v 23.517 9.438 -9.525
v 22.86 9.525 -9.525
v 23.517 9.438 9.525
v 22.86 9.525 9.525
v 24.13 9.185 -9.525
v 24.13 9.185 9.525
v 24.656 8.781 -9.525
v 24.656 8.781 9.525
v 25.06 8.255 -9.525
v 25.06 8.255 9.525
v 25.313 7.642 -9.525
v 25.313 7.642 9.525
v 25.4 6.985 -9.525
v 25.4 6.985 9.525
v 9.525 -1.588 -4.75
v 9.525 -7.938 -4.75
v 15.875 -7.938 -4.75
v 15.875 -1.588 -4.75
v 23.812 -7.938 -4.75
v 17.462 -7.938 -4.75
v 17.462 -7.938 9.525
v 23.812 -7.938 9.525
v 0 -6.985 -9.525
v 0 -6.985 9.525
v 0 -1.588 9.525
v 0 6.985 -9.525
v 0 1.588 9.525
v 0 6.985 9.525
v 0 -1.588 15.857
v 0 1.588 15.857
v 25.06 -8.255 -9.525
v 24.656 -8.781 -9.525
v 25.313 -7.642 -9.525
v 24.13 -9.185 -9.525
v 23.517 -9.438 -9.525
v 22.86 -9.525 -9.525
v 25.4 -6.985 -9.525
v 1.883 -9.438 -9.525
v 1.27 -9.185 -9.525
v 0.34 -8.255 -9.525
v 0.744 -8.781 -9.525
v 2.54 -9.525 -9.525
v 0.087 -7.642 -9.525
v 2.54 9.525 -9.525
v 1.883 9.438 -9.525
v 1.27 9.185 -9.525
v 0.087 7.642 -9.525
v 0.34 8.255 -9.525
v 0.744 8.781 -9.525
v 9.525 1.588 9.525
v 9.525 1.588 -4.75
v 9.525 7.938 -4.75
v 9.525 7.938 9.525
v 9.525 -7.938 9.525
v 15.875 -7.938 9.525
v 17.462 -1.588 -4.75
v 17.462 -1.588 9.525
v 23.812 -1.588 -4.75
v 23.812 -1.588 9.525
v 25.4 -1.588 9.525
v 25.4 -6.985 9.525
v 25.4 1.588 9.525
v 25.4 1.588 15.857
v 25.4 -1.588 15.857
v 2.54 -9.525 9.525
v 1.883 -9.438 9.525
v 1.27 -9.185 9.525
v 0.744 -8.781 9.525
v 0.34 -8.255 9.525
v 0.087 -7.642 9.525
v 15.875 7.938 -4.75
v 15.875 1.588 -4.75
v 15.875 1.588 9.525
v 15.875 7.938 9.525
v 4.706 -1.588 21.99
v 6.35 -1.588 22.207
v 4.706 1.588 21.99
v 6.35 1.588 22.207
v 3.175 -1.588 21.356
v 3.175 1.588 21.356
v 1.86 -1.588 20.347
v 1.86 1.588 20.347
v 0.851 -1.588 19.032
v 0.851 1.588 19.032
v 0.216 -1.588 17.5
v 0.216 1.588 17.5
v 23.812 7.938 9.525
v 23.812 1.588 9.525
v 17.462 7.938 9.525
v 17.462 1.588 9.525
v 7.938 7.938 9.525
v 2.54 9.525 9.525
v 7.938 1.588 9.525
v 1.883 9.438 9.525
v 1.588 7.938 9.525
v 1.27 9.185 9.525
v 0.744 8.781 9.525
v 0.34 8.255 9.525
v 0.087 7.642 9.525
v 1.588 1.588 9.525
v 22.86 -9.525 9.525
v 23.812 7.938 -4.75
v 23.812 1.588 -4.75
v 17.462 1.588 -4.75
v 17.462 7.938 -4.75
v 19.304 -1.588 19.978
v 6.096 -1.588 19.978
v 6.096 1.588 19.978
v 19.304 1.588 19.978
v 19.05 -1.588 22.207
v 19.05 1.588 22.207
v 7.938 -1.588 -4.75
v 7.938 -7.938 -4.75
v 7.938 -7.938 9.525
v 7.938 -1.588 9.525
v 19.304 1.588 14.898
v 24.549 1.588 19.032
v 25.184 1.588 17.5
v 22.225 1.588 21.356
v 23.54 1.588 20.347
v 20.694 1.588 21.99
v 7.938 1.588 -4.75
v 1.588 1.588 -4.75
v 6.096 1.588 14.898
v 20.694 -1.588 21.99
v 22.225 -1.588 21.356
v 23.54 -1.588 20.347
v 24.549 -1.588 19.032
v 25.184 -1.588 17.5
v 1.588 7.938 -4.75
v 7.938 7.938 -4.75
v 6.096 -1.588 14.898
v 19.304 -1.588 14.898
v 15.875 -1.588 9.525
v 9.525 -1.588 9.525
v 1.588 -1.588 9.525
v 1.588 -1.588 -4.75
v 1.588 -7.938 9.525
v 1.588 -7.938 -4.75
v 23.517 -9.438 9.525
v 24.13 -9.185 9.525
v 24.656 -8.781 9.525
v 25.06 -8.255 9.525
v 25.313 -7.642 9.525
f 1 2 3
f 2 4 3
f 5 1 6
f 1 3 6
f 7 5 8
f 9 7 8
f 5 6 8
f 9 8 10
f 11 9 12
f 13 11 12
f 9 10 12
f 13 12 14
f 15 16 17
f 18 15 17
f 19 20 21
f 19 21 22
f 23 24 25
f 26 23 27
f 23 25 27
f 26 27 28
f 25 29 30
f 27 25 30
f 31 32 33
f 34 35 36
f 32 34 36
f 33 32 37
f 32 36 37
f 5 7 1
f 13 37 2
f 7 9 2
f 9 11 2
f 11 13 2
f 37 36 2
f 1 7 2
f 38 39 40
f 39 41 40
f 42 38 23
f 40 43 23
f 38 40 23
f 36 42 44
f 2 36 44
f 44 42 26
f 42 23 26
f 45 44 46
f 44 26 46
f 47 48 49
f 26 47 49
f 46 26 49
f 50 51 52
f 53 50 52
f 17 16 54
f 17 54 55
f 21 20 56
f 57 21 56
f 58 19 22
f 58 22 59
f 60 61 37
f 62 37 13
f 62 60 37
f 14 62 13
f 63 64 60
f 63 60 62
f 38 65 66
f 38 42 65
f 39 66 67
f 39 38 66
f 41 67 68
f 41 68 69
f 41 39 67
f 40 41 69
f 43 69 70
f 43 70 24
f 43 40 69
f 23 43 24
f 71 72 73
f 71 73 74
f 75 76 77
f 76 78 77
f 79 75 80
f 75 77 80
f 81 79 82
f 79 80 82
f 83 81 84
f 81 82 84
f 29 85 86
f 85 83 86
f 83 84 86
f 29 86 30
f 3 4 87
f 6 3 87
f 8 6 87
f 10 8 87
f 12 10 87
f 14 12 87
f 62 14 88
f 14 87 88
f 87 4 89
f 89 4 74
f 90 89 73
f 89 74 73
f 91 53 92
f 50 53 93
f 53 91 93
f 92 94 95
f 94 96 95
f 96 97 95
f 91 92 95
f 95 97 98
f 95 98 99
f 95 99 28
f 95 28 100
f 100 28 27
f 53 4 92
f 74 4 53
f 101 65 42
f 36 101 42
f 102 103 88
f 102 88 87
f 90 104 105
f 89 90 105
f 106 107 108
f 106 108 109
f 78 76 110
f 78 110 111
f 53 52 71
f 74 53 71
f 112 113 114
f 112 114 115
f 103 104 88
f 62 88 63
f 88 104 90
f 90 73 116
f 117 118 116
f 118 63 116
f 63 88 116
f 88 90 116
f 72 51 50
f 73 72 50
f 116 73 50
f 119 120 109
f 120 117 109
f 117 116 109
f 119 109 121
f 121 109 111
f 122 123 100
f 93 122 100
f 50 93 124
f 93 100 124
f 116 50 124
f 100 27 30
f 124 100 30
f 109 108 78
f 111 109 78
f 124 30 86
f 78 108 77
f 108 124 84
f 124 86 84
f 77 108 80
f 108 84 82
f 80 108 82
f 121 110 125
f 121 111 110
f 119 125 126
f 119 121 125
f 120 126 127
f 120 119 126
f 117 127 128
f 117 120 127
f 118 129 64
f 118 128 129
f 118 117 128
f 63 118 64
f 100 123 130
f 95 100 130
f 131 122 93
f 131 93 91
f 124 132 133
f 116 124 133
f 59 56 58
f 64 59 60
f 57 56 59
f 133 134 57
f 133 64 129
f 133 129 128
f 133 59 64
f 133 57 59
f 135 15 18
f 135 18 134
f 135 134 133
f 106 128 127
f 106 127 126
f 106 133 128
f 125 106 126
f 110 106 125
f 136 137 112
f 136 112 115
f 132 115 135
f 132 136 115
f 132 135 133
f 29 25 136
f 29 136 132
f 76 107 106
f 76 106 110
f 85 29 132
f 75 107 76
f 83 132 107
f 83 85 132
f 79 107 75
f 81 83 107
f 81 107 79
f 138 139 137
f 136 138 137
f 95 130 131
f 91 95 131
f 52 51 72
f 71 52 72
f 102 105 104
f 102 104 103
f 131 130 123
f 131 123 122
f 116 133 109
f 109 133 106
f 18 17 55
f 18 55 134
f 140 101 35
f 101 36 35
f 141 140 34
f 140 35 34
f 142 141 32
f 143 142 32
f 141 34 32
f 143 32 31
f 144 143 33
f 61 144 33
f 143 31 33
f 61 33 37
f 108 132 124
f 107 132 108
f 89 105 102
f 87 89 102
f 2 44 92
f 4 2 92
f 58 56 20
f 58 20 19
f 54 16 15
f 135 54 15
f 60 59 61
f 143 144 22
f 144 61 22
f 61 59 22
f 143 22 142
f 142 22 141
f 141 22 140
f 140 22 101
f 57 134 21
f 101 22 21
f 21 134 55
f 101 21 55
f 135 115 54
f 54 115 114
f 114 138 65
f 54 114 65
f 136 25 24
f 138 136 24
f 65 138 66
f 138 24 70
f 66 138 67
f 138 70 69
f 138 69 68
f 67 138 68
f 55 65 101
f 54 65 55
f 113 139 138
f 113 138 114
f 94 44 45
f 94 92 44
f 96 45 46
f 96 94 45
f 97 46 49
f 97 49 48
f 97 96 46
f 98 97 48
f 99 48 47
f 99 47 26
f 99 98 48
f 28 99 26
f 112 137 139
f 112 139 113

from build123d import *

# Parameters (mm, degrees)
F0_W          = 3.175
F0_H          = 0.018239446
F0_H_2        = 12.681760554
F1_DEPTH      = 25.4
F2_R          = 6.35
F3_W          = 13.208
F3_H          = 5.08
F4_DEPTH      = 12.7
F5_W          = 6.35
F5_H          = 6.35
F6_DEPTH      = 4.7498
F6_DEPTH_BACK = 50.8
F7_R          = 2.54


with BuildPart() as f1:
    # F0 (on Right) → F1 (new body)
    with BuildSketch(Plane.YZ):
        Polygon((9.525, -9.525), (9.525, 9.525), (1.5875, 9.525), (1.5875, 9.506760554), (-1.5875, 9.506760554), (-1.5875, 9.525), (-9.525, 9.525), (-9.525, -9.525), align=None)
        with Locations((0, 9.515880277)):
            Rectangle(F0_W, F0_H)
        with Locations((0, 15.865880277)):
            Rectangle(F0_W, F0_H_2)
    extrude(amount=F1_DEPTH)

    # F2
    f2_edges = [f1.edges().sort_by_distance(p)[0] for p in [
        (25.4, 0, 22.206761),
        (0, 0, 22.206761),
    ]]
    fillet(f2_edges, radius=F2_R)

    # F3 (on Front) → F4 (cut, symmetric)
    with BuildSketch(Plane.XZ):
        with Locations((12.7, 17.4384163693)):
            Rectangle(F3_W, F3_H)
    extrude(amount=F4_DEPTH, both=True, mode=Mode.SUBTRACT)

    # F5 (on Top) → F6 (cut, two sides)
    with BuildSketch(Plane.XY) as f6_sk:
        with Locations((4.7625, 4.7625)):
            Rectangle(F5_W, F5_H)
        with Locations((20.6375, 4.7625)):
            Rectangle(F5_W, F5_H)
        with Locations((12.7, 4.7625)):
            Rectangle(F5_W, F5_H)
        with Locations((4.7625, -4.7625)):
            Rectangle(F5_W, F5_H)
        with Locations((12.7, -4.7625)):
            Rectangle(F5_W, F5_H)
        with Locations((20.6375, -4.7625)):
            Rectangle(F5_W, F5_H)
    extrude(amount=-F6_DEPTH, mode=Mode.SUBTRACT)
    extrude(f6_sk.sketch, amount=F6_DEPTH_BACK, mode=Mode.SUBTRACT)

    # F7
    f7_edges = [f1.edges().sort_by_distance(p)[0] for p in [
        (25.4, -9.525, 0),
        (0, -9.525, 0),
        (25.4, 9.525, 0),
        (0, 9.525, 0),
    ]]
    fillet(f7_edges, radius=F7_R)


solid = f1.part
